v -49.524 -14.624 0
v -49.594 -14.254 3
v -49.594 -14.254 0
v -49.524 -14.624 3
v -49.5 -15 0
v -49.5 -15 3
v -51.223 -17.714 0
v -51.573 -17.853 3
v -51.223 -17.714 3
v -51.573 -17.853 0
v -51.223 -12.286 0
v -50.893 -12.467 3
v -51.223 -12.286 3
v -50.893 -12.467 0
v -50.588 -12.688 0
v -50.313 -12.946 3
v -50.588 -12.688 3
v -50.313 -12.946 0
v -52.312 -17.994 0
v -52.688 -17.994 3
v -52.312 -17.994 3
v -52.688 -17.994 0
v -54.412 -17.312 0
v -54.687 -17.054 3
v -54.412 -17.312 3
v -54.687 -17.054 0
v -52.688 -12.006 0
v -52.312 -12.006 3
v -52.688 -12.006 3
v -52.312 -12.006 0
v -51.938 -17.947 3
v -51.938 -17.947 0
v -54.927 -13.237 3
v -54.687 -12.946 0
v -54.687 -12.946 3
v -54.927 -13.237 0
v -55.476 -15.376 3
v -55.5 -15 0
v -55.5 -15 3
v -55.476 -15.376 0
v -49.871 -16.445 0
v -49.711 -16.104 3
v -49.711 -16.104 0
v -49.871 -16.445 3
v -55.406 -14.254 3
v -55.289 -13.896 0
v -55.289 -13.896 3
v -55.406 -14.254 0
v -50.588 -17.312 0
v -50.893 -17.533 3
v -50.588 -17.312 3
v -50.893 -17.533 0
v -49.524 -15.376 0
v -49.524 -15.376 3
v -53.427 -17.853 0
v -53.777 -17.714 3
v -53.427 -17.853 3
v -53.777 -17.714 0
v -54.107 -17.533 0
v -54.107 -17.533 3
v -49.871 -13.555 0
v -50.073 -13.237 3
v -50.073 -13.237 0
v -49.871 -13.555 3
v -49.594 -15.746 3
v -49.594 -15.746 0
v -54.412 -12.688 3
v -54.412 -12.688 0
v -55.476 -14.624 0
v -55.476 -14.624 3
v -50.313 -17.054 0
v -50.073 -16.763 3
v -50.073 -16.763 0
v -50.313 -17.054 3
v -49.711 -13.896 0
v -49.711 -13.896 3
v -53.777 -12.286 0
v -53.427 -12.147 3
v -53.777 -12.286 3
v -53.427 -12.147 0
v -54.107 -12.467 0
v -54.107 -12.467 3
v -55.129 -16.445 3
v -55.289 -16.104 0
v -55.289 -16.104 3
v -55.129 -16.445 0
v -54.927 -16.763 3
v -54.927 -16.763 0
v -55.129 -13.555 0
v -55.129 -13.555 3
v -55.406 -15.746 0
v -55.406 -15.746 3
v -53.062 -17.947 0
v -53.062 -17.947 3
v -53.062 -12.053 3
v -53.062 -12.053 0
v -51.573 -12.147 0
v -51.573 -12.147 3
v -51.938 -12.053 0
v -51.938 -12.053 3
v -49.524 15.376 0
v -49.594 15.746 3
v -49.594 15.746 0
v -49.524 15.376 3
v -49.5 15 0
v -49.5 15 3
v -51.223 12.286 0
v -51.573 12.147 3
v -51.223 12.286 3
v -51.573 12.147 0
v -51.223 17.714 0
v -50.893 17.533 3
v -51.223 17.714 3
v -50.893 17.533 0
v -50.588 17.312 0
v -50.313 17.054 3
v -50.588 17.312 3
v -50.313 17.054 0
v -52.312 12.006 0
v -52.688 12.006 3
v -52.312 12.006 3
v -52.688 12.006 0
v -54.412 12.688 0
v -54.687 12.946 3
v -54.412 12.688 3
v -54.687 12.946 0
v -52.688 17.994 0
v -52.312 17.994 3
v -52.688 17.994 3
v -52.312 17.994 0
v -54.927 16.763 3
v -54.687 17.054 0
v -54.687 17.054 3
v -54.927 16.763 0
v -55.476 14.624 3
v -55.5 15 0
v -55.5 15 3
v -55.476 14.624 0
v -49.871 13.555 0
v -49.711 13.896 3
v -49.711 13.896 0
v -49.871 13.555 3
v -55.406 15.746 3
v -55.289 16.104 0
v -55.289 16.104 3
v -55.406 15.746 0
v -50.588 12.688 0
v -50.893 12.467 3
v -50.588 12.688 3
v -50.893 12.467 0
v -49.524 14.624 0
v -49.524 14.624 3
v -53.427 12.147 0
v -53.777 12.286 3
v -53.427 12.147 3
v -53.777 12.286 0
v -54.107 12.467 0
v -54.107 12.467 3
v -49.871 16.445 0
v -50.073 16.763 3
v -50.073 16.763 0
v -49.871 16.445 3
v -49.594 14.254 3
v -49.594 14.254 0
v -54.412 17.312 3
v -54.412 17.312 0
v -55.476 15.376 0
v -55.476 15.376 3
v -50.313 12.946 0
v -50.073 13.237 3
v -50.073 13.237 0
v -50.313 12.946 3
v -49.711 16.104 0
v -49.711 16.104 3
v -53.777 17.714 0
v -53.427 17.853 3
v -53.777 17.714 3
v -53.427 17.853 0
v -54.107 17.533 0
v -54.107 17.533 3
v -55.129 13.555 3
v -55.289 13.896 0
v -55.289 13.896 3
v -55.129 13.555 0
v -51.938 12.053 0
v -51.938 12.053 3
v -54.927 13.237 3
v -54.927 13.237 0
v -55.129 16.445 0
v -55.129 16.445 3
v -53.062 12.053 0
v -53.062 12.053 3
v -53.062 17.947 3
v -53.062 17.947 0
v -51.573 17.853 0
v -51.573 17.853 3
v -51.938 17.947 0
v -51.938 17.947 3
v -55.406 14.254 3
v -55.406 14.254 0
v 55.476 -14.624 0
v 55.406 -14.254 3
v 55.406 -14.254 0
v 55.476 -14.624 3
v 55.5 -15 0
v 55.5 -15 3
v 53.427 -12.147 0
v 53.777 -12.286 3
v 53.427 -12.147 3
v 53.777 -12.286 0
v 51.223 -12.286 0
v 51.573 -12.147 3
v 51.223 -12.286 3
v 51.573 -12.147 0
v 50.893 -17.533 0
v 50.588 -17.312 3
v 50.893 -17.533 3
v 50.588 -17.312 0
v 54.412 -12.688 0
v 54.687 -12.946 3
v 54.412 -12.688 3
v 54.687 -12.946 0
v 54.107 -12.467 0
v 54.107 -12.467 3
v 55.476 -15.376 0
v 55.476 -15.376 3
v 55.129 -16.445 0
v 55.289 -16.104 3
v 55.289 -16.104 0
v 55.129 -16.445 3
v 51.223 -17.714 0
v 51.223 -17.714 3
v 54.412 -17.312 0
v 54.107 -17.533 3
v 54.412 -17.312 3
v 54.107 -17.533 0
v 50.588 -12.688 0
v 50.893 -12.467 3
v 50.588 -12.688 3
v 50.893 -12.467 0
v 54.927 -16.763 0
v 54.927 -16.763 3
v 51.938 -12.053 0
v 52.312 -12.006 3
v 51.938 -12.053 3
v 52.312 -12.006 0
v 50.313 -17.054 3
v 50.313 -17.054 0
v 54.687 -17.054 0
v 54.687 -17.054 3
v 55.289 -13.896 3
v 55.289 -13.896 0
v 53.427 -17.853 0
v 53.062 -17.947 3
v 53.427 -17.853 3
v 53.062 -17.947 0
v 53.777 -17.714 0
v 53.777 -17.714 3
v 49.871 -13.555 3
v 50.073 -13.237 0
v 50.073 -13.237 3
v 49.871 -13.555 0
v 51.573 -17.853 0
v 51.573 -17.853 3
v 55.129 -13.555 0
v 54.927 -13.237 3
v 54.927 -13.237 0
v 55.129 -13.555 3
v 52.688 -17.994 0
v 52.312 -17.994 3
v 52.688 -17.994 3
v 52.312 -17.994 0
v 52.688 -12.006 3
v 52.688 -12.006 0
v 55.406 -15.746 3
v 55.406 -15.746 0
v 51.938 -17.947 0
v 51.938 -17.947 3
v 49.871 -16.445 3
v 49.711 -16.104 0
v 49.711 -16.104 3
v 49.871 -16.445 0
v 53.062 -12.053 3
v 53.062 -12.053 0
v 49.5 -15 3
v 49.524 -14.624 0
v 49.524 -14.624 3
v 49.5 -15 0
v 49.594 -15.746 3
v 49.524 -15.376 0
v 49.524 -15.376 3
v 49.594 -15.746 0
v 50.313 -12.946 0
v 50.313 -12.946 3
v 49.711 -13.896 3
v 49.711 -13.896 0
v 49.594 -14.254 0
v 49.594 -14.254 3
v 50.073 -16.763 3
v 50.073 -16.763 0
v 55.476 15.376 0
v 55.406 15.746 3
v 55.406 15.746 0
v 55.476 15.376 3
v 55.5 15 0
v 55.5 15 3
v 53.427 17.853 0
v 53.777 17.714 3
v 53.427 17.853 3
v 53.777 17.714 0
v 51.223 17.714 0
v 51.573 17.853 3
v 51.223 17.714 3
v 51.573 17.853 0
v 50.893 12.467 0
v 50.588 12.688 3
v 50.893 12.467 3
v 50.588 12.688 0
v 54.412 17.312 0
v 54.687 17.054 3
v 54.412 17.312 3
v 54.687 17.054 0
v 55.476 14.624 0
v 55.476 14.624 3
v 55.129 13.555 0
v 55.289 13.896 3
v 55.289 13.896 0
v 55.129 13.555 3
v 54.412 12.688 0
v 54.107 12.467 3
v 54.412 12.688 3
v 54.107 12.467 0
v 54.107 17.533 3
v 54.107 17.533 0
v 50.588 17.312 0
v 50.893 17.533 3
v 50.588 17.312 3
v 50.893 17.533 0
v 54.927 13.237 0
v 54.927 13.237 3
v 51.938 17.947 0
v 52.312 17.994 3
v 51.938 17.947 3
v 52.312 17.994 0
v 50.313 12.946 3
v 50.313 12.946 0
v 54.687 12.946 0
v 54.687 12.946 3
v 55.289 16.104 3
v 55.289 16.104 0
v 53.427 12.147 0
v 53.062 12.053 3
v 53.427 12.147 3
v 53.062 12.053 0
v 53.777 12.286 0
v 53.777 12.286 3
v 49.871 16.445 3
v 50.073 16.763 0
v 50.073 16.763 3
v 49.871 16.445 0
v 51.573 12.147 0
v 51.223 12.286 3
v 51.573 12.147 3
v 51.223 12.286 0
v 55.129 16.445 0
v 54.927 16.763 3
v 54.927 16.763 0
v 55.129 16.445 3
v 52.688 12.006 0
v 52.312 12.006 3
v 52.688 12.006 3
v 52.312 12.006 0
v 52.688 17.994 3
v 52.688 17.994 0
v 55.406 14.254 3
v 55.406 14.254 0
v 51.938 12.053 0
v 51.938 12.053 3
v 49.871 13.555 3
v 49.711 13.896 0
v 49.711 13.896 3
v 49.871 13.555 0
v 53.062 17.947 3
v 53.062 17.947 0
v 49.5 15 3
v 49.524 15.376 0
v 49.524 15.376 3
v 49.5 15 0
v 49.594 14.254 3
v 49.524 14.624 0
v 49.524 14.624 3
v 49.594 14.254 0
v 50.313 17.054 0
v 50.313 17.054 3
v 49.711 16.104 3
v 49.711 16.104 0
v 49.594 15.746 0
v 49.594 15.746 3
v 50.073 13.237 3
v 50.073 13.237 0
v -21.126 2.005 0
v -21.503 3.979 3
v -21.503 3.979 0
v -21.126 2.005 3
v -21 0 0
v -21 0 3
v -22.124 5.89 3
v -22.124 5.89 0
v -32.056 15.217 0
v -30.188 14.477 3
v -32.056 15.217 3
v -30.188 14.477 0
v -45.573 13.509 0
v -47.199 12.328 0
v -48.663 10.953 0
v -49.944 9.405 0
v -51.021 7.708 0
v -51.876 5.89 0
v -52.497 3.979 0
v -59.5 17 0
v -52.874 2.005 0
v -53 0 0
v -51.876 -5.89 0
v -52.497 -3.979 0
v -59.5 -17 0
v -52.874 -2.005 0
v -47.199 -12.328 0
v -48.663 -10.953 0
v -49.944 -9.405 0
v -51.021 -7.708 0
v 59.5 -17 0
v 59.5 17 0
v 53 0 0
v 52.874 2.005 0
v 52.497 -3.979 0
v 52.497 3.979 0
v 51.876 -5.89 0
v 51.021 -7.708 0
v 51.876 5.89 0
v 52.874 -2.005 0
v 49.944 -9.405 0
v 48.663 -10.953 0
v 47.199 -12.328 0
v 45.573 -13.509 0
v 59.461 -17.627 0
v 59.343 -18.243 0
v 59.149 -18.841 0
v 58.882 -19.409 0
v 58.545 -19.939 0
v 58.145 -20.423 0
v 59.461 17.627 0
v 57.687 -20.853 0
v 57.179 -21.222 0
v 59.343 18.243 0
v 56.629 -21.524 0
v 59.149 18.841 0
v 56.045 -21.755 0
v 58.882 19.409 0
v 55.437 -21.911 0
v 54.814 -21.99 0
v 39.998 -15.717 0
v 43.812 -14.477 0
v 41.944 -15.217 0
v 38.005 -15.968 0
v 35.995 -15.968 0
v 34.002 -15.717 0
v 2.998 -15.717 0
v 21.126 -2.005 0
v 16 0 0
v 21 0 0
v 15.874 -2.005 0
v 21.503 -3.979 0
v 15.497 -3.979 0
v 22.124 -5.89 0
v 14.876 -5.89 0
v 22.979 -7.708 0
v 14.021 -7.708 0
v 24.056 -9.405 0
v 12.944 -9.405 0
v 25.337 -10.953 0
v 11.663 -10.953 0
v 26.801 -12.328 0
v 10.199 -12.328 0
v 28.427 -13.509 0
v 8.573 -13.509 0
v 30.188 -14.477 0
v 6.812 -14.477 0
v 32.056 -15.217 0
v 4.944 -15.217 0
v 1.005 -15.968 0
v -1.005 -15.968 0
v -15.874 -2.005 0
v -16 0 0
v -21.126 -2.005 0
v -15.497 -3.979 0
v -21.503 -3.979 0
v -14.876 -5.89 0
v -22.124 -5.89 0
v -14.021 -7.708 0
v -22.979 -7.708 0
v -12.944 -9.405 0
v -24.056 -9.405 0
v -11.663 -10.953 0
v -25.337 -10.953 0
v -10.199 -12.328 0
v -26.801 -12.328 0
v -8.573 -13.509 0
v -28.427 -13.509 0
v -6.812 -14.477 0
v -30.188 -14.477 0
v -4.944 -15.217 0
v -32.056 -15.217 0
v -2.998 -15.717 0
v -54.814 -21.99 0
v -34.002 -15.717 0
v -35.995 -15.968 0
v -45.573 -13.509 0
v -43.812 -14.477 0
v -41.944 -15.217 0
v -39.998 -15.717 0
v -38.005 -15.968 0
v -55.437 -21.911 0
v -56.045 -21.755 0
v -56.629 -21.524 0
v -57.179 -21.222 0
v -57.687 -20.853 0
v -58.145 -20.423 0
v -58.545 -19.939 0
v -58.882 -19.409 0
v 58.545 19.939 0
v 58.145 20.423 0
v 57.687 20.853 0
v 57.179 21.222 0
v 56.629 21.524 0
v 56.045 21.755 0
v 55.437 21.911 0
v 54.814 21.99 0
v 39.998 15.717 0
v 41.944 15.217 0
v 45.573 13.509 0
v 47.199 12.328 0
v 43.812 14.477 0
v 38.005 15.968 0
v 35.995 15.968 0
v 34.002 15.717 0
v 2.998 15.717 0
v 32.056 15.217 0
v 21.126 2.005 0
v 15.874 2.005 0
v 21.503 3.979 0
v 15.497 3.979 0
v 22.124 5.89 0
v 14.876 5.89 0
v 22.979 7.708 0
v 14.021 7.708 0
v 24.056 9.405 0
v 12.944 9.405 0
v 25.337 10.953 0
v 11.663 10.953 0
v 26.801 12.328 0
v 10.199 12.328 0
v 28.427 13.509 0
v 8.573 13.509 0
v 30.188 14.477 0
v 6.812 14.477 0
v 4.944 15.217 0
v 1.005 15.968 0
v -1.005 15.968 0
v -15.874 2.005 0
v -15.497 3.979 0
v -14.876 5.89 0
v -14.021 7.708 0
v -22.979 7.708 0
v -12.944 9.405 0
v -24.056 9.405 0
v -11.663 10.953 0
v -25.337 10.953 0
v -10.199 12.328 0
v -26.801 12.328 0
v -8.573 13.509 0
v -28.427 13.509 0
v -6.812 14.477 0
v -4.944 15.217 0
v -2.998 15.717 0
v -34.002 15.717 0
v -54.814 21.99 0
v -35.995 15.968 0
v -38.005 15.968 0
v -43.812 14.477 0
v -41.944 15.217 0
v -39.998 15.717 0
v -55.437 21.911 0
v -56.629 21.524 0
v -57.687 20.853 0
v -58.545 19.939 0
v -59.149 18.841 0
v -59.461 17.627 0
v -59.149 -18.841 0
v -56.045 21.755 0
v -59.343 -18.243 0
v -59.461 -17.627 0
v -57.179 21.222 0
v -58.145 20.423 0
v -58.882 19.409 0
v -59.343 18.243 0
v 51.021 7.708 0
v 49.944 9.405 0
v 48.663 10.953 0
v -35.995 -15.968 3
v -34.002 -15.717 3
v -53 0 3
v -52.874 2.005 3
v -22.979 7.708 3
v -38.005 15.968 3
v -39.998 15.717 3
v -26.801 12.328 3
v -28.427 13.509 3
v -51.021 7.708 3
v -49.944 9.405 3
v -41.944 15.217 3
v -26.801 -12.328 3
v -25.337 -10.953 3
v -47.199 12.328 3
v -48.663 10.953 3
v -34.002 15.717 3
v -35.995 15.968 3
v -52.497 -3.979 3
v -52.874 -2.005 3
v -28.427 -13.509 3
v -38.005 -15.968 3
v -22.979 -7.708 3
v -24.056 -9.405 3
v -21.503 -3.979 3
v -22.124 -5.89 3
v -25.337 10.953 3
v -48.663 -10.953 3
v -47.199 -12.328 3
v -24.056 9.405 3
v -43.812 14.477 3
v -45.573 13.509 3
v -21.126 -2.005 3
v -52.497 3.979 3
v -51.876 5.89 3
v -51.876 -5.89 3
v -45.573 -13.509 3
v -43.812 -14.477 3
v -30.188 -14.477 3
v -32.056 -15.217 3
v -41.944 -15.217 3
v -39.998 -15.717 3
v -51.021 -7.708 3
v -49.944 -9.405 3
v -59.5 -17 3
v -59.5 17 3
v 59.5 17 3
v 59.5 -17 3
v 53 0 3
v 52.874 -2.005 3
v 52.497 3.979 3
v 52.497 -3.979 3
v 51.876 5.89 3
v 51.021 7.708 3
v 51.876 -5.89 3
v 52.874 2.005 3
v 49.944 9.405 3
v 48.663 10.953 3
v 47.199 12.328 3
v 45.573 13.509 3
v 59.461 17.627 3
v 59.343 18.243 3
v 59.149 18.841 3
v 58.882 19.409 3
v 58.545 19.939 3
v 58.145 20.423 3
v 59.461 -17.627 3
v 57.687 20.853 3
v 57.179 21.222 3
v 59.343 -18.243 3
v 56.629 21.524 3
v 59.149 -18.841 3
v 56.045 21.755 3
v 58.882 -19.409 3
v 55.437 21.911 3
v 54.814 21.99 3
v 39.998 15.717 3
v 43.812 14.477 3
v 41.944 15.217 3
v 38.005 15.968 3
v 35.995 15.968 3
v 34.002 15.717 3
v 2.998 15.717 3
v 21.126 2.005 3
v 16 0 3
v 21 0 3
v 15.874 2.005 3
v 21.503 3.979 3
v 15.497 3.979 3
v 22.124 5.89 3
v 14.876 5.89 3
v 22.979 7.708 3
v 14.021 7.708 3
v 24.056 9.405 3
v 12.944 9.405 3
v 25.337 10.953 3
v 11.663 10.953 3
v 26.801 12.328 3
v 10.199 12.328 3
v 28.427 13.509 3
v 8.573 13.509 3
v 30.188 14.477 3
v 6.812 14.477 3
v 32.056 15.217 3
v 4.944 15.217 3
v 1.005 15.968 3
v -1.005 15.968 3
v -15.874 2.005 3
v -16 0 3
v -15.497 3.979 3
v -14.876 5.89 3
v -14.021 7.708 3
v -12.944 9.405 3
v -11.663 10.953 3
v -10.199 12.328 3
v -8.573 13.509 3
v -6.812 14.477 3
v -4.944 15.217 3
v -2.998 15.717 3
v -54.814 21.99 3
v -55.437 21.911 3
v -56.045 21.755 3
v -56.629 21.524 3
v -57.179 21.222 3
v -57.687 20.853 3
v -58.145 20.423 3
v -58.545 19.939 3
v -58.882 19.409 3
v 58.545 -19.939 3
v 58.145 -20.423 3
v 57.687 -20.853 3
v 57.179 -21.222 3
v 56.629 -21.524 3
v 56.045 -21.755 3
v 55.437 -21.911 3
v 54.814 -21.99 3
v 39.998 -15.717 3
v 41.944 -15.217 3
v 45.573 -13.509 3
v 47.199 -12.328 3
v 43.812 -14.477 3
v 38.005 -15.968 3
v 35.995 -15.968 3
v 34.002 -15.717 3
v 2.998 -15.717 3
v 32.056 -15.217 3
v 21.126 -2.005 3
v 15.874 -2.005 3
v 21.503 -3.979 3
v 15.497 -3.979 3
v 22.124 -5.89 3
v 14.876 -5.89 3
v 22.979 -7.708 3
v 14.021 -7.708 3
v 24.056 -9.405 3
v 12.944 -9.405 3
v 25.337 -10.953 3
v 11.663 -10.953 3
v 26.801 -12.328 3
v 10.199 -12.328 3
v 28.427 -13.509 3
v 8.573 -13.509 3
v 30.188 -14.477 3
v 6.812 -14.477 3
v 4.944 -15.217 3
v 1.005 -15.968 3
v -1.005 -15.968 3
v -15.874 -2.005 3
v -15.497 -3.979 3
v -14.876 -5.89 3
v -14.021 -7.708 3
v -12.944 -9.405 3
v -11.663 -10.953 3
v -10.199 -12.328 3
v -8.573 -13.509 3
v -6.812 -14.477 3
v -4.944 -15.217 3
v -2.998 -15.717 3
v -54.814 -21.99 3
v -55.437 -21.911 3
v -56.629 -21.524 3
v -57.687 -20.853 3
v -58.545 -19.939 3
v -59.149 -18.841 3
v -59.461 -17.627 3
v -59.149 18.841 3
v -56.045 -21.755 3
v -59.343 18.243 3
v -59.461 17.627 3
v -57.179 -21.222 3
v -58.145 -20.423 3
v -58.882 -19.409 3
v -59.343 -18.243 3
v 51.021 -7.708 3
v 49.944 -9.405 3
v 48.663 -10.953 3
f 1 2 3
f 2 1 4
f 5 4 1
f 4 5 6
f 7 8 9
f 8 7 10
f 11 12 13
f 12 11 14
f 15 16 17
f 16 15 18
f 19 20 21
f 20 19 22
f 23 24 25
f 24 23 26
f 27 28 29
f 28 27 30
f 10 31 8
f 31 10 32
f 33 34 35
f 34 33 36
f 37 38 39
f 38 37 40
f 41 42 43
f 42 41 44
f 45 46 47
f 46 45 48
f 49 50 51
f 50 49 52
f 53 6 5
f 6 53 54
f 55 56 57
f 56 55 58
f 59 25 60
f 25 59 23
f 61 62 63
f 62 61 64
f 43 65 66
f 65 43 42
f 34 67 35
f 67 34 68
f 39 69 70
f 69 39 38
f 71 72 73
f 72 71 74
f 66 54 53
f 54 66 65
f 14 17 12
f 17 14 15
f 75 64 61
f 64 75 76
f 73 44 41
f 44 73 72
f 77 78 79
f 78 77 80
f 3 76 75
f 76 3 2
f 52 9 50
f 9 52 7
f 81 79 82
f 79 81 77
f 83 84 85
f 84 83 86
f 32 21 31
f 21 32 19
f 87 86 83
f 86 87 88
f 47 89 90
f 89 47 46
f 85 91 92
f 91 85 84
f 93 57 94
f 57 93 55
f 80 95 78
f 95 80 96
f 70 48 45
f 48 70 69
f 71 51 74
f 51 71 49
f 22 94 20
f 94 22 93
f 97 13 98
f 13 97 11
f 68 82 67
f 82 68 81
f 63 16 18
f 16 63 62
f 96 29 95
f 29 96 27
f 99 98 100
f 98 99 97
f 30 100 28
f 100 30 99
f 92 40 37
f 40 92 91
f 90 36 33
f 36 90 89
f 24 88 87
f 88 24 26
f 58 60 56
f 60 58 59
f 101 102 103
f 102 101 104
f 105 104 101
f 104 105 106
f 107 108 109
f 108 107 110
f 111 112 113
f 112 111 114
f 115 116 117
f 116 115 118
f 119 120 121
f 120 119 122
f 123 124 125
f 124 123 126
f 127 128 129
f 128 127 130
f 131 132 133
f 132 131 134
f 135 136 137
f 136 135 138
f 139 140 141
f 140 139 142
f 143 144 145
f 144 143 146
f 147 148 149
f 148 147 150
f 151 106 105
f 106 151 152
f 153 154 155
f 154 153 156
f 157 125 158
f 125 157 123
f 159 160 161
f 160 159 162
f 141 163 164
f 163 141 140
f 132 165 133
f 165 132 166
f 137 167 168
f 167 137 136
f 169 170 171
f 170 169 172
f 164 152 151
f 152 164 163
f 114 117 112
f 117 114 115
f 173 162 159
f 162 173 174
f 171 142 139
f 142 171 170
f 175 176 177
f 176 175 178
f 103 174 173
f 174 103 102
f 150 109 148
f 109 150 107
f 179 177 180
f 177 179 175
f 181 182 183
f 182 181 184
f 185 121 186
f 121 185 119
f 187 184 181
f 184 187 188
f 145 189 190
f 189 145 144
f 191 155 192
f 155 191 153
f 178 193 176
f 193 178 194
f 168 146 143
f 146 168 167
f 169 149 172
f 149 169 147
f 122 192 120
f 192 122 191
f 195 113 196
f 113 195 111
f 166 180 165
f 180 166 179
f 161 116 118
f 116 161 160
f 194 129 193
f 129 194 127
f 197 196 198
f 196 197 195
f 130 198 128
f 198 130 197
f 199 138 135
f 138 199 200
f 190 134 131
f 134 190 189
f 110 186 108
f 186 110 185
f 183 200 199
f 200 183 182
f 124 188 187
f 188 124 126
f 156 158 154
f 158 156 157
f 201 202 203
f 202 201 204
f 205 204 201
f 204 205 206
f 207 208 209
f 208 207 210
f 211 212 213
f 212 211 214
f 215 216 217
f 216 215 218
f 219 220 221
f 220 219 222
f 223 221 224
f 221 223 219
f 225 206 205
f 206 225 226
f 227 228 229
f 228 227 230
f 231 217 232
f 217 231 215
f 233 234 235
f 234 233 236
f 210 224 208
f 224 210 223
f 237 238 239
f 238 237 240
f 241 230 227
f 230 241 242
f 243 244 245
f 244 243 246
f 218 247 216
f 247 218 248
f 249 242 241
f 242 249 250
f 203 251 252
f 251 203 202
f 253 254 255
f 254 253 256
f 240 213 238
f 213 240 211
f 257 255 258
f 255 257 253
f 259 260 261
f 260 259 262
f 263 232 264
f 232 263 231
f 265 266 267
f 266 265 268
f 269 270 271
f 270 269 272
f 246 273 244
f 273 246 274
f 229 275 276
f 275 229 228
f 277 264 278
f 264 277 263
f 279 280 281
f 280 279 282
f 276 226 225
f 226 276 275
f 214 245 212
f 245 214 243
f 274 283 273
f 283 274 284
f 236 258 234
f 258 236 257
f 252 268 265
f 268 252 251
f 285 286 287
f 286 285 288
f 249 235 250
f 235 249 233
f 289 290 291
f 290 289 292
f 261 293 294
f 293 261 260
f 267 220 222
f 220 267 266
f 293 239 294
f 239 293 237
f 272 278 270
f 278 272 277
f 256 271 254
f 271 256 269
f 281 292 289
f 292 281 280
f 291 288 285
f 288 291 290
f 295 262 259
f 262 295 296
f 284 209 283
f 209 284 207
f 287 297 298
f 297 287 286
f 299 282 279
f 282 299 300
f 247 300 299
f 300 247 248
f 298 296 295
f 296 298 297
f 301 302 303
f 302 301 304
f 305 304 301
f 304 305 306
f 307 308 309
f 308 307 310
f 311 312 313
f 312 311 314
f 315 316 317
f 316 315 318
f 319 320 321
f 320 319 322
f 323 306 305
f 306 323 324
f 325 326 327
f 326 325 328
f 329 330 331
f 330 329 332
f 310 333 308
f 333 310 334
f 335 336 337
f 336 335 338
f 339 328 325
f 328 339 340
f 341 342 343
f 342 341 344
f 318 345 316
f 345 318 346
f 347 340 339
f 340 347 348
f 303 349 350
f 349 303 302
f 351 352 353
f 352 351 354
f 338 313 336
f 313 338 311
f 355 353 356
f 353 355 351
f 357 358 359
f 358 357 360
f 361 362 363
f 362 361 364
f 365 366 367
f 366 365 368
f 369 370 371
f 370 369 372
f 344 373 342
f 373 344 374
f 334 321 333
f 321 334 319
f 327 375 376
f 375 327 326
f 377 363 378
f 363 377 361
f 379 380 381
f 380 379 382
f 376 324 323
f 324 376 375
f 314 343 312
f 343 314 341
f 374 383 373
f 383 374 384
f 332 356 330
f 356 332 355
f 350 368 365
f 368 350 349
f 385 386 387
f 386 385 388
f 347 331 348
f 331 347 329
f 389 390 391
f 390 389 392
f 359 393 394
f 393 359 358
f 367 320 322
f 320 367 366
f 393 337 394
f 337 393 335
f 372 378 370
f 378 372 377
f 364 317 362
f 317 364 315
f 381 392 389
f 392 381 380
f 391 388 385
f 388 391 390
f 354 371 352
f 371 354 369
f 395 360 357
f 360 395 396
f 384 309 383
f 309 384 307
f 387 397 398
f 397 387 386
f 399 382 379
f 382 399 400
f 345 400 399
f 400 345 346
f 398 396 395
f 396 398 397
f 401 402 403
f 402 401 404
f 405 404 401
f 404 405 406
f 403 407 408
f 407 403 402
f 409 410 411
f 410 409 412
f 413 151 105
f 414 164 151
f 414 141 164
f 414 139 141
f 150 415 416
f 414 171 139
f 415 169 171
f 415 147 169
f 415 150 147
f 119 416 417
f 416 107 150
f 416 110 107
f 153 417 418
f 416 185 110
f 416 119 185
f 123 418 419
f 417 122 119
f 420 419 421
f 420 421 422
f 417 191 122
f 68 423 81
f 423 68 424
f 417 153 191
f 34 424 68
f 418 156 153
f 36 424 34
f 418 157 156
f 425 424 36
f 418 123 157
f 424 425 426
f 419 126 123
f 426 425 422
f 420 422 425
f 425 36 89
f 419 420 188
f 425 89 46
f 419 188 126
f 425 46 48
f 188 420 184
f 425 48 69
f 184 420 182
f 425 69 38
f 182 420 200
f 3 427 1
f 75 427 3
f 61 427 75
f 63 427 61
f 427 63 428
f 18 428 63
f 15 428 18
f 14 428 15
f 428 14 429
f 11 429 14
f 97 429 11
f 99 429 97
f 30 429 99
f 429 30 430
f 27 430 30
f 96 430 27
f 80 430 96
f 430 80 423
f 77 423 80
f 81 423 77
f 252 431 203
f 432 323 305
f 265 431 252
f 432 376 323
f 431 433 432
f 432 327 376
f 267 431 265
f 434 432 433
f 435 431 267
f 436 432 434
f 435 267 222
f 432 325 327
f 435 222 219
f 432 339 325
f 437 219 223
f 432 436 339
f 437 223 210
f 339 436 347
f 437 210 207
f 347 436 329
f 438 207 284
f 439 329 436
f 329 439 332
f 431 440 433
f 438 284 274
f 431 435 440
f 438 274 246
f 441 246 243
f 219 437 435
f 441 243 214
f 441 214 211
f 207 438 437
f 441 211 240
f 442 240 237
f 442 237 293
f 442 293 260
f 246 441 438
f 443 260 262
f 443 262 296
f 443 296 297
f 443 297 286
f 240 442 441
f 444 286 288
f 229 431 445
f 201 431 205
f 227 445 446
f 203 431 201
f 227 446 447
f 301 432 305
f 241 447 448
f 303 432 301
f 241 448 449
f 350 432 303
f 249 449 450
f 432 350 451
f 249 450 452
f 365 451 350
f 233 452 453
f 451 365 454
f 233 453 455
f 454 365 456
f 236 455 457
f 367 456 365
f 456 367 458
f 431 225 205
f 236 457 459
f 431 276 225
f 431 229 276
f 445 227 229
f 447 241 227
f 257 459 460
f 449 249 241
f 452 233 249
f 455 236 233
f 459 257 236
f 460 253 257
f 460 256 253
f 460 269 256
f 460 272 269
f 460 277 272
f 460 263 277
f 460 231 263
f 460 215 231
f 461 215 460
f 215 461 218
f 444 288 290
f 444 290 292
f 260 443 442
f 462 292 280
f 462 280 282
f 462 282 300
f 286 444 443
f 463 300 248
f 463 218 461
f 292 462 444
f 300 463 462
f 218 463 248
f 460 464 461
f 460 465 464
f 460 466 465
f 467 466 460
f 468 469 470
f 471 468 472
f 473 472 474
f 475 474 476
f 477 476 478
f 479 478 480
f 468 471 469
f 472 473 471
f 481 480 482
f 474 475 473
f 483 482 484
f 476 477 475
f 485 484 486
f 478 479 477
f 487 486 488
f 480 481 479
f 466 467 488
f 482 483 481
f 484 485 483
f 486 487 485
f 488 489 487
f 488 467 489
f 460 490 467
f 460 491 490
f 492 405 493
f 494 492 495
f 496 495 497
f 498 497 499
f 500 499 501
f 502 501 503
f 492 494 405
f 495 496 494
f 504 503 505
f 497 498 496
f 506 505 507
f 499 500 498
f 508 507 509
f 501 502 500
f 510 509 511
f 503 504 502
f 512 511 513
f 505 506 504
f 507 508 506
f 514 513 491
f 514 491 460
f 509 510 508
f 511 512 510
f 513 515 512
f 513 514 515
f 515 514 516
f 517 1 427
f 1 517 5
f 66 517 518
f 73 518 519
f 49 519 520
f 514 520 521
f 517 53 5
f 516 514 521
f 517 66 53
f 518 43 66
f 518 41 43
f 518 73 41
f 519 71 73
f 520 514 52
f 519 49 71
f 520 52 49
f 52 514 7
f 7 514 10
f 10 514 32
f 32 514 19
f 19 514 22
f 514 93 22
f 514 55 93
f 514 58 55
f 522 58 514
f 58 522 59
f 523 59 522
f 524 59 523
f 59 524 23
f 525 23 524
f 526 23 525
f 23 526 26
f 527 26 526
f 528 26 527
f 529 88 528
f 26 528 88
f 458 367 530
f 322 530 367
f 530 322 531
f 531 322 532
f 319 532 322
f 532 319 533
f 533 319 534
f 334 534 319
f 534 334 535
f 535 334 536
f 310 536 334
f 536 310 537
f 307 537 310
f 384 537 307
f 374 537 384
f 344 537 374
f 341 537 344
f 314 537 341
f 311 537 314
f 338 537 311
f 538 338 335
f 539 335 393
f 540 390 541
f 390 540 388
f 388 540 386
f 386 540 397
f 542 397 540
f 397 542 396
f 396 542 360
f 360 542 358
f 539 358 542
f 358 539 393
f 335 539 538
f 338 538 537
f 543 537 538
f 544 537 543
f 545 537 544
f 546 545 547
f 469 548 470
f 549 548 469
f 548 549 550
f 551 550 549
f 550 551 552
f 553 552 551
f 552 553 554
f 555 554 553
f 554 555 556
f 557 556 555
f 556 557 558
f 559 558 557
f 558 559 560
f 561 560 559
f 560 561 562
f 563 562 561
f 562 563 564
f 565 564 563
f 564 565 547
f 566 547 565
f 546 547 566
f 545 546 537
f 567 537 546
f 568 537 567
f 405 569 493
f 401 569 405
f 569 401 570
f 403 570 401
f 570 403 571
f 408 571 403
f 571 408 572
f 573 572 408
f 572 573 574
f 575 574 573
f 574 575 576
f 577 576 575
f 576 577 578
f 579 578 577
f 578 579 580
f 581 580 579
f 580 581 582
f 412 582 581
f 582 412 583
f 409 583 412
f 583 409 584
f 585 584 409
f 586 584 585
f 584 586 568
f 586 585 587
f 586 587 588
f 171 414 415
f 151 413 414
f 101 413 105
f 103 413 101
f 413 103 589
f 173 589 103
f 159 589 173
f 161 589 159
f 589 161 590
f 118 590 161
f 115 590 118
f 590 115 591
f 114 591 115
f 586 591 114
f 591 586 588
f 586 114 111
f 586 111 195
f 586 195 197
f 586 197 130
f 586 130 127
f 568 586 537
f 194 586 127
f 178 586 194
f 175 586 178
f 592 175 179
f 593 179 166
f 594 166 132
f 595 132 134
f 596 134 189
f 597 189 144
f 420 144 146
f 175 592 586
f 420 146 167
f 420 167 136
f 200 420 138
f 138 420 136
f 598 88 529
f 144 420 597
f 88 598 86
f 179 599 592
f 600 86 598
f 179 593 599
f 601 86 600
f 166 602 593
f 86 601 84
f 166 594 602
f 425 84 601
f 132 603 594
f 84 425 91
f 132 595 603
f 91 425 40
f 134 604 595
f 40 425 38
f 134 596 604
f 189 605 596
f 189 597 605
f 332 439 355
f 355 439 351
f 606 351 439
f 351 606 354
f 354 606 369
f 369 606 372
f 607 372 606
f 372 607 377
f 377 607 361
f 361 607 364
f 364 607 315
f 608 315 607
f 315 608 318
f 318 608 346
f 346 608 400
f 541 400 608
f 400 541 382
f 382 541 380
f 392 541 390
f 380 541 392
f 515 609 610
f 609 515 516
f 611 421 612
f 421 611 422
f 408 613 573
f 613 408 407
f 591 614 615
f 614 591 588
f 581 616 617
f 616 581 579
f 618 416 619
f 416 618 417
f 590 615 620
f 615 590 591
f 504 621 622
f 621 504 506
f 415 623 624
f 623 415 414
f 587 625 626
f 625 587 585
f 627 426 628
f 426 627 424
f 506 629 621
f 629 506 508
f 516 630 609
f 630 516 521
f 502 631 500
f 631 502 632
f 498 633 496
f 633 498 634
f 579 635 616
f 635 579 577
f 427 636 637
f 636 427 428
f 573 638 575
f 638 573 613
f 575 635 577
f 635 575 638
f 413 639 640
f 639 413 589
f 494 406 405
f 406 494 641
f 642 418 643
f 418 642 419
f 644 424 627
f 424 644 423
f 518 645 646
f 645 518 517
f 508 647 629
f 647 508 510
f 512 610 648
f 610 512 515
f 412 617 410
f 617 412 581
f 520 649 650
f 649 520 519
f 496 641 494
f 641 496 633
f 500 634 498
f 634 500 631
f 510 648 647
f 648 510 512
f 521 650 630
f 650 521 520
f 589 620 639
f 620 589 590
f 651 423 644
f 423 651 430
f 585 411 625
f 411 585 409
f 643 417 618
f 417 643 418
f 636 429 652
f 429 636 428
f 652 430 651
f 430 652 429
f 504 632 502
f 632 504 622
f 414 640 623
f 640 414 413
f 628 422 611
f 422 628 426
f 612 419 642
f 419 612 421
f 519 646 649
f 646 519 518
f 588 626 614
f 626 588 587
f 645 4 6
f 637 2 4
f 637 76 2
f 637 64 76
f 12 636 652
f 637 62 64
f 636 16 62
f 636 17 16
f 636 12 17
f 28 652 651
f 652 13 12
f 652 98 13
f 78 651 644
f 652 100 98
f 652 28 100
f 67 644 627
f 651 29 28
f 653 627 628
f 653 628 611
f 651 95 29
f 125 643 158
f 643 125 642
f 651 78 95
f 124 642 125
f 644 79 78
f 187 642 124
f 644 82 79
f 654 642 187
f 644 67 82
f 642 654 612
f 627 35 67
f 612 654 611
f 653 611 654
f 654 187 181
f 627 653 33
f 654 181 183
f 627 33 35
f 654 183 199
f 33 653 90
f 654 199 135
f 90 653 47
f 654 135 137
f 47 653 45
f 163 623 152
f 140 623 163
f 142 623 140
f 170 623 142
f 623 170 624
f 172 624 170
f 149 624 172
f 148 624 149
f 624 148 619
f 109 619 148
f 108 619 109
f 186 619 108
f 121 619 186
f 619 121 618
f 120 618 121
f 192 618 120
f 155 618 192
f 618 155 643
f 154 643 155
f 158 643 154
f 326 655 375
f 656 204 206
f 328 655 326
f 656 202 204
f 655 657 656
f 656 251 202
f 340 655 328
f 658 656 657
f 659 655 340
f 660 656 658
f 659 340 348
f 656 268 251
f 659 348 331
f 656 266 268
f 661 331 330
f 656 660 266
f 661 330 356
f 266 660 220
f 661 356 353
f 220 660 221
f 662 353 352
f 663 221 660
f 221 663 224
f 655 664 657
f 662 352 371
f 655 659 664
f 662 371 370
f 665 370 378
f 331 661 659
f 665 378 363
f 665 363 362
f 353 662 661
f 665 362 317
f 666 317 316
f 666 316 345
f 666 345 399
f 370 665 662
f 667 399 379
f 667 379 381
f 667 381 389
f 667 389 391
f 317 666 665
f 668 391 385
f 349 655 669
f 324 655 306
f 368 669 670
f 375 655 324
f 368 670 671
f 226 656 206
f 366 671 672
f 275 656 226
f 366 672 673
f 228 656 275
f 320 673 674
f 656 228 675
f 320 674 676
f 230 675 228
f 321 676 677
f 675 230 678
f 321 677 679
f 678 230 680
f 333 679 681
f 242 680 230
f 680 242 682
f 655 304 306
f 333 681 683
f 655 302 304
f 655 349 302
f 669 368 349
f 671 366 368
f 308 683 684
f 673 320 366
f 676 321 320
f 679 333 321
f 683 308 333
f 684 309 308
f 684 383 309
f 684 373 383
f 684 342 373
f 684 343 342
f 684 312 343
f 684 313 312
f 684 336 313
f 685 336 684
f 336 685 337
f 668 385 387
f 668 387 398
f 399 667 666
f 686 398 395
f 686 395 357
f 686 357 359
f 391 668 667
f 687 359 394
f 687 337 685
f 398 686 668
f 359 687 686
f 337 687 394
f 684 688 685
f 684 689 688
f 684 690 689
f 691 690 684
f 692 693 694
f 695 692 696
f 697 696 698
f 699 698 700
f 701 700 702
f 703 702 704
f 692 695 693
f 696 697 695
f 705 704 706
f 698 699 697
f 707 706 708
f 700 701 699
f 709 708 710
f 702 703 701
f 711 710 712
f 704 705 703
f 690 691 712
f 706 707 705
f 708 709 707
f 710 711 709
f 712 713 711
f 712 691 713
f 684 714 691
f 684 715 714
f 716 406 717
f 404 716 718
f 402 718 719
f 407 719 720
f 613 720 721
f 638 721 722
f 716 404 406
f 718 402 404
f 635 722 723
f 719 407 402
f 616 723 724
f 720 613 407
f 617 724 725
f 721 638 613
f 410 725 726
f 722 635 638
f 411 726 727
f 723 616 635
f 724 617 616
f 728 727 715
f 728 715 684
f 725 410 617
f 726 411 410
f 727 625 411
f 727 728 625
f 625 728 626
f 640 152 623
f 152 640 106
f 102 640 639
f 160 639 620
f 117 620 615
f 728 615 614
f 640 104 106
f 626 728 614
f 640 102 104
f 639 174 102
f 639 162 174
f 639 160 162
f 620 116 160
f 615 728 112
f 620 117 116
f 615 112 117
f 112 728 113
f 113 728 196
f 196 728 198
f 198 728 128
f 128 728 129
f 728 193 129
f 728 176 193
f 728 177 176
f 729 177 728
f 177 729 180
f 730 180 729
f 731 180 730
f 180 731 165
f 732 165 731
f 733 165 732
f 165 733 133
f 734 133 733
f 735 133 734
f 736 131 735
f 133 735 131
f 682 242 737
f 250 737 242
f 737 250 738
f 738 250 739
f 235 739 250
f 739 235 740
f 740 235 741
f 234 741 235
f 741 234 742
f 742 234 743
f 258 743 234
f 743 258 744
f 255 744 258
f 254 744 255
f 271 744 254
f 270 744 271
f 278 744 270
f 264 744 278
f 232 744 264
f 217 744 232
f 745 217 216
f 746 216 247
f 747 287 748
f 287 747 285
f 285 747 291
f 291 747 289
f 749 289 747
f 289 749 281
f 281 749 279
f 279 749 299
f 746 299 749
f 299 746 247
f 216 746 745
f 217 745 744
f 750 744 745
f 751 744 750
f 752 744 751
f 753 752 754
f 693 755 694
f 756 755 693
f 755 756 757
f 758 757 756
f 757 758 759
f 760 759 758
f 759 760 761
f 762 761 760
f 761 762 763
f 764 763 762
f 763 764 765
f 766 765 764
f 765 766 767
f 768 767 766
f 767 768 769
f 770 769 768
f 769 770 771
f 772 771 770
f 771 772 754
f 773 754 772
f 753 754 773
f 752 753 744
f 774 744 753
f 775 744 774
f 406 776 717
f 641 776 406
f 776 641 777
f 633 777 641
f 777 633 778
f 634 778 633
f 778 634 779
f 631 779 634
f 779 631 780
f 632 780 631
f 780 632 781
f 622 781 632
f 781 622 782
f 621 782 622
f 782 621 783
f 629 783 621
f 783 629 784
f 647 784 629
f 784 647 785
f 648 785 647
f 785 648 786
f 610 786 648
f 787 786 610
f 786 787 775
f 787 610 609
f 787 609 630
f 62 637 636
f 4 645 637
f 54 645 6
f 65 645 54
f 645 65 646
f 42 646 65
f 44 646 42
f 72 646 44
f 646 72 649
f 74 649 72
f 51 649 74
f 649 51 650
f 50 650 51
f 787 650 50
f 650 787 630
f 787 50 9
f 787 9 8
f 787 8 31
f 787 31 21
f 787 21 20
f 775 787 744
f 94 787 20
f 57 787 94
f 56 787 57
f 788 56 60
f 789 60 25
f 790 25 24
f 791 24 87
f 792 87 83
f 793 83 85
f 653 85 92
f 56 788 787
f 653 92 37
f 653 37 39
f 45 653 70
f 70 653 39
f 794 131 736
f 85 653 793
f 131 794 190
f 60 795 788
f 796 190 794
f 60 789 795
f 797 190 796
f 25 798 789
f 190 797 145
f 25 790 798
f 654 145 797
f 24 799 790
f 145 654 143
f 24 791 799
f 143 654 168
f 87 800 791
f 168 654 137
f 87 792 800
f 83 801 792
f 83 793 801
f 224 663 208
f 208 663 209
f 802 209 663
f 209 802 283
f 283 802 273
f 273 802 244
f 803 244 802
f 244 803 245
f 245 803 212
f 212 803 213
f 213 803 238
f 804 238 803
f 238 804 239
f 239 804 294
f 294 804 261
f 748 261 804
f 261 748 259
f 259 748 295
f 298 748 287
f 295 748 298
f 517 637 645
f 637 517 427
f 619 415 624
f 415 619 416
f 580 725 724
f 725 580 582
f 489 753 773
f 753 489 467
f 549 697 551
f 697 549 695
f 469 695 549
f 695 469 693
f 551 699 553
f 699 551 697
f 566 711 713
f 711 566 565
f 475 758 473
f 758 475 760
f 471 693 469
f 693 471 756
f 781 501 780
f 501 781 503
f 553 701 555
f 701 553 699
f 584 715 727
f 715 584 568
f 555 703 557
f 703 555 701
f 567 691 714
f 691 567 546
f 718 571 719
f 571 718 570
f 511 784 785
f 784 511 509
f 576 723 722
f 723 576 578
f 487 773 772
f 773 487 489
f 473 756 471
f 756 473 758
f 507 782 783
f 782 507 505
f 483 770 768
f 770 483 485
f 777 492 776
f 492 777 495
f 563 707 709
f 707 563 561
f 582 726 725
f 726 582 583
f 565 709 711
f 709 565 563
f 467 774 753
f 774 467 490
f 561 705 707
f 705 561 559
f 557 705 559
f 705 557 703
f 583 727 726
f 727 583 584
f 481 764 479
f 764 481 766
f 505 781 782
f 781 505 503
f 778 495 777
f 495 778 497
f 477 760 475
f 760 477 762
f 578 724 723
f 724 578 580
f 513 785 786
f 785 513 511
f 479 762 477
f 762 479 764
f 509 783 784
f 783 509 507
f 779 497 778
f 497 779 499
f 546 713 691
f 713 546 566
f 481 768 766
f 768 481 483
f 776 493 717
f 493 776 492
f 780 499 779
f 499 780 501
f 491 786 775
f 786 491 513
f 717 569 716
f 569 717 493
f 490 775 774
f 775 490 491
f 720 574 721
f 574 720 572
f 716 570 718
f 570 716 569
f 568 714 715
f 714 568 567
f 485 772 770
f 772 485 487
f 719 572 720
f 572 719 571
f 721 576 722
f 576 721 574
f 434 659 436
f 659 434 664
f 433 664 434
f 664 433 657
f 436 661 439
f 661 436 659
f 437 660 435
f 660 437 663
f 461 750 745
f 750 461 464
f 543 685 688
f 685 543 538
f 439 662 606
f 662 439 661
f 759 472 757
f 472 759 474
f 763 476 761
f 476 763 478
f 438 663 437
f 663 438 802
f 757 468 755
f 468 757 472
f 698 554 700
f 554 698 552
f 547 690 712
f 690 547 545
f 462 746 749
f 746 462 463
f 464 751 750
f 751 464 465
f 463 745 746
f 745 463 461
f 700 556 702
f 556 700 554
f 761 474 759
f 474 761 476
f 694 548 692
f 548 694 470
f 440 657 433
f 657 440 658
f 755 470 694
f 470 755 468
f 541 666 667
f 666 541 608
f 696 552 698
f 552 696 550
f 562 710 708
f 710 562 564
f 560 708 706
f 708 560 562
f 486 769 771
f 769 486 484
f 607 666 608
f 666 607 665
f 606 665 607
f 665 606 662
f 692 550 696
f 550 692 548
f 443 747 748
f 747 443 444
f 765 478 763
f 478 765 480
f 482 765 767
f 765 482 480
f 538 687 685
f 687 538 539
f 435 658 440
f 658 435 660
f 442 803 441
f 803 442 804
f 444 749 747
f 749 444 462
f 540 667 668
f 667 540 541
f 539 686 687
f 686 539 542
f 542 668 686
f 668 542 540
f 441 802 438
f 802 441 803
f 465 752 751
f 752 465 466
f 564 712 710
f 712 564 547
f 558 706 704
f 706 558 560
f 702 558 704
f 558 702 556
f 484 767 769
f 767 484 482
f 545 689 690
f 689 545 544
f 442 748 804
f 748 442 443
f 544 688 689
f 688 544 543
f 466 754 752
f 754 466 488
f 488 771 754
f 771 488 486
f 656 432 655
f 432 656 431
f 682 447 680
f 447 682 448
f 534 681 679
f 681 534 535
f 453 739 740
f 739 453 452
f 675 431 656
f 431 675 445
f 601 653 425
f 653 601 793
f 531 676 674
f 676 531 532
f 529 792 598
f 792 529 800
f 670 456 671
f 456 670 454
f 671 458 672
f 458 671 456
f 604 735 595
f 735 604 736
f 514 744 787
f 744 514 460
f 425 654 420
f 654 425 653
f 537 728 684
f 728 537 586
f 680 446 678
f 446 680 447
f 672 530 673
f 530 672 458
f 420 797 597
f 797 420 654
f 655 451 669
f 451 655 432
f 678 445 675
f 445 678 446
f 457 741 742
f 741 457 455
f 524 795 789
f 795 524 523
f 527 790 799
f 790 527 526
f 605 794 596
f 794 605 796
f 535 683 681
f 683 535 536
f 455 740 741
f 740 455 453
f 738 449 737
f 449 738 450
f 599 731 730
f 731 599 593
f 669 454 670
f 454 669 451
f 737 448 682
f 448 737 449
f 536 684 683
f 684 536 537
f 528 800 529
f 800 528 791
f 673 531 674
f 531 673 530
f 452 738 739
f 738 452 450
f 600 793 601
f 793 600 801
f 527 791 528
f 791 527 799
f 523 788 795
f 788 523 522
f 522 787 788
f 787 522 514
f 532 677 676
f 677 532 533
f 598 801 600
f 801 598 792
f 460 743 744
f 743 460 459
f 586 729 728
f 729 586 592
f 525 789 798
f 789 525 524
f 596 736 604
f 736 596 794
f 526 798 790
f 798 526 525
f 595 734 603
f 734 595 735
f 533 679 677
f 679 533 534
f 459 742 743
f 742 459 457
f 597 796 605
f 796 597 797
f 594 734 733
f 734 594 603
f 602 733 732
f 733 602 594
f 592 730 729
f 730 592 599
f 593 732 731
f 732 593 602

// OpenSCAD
$fn = 50;


difference() {
	union() {
		hull() {
			translate(v = [-54.5000000000, 17.0000000000, 0]) {
				cylinder(h = 3, r = 5);
			}
			translate(v = [54.5000000000, 17.0000000000, 0]) {
				cylinder(h = 3, r = 5);
			}
			translate(v = [-54.5000000000, -17.0000000000, 0]) {
				cylinder(h = 3, r = 5);
			}
			translate(v = [54.5000000000, -17.0000000000, 0]) {
				cylinder(h = 3, r = 5);
			}
		}
	}
	union() {
		#translate(v = [-52.5000000000, -15.0000000000, -100.0000000000]) {
			cylinder(h = 200, r = 3.0000000000);
		}
		#translate(v = [-52.5000000000, 15.0000000000, -100.0000000000]) {
			cylinder(h = 200, r = 3.0000000000);
		}
		#translate(v = [52.5000000000, -15.0000000000, -100.0000000000]) {
			cylinder(h = 200, r = 3.0000000000);
		}
		#translate(v = [52.5000000000, 15.0000000000, -100.0000000000]) {
			cylinder(h = 200, r = 3.0000000000);
		}
		#translate(v = [-37.0000000000, 0, 0]) {
			cylinder(h = 3, r = 16.0000000000);
		}
		#cylinder(h = 3, r = 16.0000000000);
		#translate(v = [37.0000000000, 0, 0]) {
			cylinder(h = 3, r = 16.0000000000);
		}
	}
}
